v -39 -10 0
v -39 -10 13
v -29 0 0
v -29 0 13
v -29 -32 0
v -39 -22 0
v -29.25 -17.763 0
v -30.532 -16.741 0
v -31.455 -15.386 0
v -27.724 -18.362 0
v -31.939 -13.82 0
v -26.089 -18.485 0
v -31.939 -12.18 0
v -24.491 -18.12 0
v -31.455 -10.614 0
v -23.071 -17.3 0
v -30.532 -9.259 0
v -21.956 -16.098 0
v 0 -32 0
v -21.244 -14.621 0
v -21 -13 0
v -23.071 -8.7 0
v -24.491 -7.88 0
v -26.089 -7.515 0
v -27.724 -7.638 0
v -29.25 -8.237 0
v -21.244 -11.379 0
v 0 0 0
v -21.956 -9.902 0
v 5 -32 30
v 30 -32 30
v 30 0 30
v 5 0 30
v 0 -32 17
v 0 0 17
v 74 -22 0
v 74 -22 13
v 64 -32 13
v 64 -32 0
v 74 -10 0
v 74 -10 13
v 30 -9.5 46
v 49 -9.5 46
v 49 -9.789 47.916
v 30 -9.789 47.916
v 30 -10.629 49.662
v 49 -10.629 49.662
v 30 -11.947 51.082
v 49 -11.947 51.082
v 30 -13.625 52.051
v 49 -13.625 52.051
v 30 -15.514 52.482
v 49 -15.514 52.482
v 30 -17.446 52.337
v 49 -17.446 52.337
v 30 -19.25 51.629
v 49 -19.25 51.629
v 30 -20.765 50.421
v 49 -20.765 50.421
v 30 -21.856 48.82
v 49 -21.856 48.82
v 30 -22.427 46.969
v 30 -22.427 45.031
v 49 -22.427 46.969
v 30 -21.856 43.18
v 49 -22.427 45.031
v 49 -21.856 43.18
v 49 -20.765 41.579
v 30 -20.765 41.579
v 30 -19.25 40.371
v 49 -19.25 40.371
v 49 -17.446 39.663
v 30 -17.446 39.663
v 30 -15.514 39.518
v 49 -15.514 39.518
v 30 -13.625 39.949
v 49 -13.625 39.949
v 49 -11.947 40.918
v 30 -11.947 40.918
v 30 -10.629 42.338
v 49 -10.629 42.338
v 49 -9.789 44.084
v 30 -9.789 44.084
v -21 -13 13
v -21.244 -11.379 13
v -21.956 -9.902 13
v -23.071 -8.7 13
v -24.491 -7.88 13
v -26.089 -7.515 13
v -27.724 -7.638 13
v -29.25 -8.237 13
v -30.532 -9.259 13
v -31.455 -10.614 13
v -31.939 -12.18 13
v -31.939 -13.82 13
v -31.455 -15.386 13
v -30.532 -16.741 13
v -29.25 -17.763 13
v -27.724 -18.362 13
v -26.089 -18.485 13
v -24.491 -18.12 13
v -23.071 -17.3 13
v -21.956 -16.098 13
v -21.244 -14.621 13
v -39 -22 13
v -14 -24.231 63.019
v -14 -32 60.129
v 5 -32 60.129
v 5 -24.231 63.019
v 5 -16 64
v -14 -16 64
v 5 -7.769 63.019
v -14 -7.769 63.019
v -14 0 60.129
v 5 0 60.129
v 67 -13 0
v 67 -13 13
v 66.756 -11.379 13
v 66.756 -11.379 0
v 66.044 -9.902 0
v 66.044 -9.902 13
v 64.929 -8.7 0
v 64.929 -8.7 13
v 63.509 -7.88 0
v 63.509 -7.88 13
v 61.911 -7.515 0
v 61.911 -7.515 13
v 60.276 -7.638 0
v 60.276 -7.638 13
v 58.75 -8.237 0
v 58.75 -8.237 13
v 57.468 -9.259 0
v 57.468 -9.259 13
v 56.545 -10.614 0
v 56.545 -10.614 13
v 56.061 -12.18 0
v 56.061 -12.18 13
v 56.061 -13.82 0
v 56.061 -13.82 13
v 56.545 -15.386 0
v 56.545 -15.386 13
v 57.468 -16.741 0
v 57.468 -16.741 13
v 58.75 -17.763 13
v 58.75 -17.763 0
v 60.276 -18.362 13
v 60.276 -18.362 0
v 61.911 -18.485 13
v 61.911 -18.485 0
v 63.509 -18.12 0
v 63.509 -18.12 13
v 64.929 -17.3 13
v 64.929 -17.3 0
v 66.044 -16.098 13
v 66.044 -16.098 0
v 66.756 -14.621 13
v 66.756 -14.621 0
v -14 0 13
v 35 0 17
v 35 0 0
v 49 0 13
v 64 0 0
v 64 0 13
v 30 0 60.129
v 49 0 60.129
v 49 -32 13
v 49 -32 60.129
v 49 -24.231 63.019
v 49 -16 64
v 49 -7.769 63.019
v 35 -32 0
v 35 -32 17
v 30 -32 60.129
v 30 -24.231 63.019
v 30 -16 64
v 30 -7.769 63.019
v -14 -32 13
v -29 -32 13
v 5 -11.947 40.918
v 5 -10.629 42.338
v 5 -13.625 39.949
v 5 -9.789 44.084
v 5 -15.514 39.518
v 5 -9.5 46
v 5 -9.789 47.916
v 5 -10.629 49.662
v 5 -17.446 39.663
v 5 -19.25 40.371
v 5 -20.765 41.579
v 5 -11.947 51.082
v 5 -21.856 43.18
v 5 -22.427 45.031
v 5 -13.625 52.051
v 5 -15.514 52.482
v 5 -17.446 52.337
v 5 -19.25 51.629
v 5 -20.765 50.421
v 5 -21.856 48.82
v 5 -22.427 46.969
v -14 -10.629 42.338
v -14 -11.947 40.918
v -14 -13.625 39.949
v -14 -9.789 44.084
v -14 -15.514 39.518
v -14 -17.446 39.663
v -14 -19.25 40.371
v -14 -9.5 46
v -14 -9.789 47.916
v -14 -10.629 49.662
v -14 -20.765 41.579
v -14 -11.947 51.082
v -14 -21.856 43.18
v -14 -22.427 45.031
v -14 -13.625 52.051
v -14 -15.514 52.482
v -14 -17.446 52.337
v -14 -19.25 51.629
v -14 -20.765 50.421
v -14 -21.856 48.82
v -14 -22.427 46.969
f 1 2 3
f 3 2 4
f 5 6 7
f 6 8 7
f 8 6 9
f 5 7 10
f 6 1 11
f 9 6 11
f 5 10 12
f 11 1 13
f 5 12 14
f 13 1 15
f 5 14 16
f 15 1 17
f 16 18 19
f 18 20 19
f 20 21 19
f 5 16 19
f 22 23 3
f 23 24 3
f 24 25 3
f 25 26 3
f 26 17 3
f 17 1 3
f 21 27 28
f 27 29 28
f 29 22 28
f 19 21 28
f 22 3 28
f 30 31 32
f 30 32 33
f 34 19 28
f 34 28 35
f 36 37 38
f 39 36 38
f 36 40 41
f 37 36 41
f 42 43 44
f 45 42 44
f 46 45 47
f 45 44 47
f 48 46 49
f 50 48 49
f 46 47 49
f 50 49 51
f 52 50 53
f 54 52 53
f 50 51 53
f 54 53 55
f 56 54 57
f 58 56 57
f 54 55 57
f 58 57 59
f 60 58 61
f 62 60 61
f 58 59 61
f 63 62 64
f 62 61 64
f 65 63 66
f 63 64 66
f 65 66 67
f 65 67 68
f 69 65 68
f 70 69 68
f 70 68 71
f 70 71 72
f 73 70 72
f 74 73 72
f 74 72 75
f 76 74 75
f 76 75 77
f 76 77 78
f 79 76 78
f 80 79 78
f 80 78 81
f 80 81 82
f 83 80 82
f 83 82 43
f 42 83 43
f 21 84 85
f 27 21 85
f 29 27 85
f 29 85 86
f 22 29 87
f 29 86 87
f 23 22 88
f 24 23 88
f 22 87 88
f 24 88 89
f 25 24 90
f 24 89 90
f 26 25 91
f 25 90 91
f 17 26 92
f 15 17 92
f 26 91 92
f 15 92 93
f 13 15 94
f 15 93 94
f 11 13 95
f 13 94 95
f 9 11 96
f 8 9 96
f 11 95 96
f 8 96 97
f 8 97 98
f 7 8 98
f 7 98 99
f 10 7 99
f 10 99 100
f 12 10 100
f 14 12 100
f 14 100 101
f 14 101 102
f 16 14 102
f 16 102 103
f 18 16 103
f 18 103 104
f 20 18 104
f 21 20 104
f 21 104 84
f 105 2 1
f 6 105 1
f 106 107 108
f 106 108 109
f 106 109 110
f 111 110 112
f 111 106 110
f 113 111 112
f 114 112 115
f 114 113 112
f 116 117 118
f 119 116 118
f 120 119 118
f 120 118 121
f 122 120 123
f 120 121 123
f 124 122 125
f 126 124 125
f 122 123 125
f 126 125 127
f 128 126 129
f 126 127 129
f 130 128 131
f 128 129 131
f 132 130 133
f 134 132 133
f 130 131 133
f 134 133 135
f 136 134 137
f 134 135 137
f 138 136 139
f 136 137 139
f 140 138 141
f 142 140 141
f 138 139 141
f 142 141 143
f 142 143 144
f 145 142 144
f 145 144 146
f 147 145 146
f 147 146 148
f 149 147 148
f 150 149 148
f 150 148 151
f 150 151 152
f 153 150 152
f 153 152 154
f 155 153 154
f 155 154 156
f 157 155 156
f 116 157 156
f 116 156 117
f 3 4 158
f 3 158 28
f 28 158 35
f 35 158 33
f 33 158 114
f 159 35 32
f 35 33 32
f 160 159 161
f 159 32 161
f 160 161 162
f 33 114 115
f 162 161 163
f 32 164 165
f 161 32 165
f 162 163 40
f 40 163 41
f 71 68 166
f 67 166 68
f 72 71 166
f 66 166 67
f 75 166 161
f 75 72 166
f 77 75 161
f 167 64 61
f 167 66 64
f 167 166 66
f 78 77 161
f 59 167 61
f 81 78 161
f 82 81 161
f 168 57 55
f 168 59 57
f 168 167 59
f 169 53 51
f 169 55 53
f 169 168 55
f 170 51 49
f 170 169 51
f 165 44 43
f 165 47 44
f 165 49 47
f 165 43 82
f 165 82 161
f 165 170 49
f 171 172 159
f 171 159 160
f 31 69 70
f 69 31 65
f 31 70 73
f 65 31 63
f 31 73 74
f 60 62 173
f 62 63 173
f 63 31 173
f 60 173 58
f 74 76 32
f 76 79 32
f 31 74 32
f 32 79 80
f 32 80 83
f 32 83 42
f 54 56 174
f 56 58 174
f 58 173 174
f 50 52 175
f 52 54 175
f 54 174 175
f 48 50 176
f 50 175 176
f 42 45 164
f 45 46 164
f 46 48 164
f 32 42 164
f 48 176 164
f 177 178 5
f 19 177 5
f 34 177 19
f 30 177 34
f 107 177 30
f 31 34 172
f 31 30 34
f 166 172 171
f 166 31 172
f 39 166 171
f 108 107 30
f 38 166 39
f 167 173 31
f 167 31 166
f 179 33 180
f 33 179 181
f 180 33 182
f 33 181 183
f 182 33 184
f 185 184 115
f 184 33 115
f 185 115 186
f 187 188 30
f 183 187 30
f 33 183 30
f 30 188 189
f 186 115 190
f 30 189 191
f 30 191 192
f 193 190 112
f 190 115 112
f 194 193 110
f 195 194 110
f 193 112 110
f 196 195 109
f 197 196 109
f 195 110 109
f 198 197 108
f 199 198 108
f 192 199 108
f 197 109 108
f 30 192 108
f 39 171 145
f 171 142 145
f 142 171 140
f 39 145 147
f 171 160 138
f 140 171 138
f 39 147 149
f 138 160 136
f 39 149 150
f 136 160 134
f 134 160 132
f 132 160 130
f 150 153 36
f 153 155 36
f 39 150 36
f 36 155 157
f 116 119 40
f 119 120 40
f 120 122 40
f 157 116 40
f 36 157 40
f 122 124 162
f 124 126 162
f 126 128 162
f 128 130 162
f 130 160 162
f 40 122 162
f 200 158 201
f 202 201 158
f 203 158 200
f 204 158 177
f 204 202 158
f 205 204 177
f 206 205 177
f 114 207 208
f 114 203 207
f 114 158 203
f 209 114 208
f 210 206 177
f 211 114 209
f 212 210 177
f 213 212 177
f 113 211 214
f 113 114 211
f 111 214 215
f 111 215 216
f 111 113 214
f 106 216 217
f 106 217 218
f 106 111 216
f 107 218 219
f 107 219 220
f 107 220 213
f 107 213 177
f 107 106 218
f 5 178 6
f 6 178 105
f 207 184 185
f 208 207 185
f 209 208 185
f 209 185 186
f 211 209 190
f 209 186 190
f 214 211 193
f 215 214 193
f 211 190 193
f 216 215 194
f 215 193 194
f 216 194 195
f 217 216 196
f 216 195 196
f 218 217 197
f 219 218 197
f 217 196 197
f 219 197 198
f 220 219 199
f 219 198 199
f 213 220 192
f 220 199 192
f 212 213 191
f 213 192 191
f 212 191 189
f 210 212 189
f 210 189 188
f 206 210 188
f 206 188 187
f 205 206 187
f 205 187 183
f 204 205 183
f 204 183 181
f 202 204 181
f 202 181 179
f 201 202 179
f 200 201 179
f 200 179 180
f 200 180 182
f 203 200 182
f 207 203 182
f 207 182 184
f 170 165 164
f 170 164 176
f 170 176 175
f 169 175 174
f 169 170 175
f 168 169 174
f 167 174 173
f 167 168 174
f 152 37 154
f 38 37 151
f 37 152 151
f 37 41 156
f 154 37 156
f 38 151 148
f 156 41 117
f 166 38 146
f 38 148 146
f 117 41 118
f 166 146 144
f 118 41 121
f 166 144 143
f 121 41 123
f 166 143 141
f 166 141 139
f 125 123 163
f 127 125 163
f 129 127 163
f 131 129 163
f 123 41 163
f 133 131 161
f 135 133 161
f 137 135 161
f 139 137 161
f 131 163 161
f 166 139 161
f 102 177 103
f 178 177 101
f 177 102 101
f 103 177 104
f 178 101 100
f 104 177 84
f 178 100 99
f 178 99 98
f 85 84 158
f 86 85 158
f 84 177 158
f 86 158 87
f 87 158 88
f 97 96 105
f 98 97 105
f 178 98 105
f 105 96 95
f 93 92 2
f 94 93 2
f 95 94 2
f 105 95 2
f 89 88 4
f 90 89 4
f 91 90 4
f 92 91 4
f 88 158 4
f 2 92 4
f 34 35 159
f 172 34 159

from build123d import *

# Parameters (mm, degrees)
F1_DEPTH  = 32
F3_DEPTH  = 25
F4_R      = 5.5
F5_DEPTH  = 25
F6_R      = 5.5
F7_DEPTH  = 25
F10_DEPTH = 19
F8_R      = 6.5
F11_DEPTH = 88.001
F13_DEPTH = 19


with BuildPart() as f1:
    # F0 (on Front) → F1 (new body)
    with BuildSketch(Plane.XZ):
        Polygon((-39, 13), (-39, 0), (0, 0), (0, 17), (35, 17), (35, 0), (74, 0), (74, 13), (49, 13), (49, 60.129), (30, 60.129), (30, 30), (5, 30), (5, 60.129), (-14, 60.129), (-14, 13), align=None)
    extrude(amount=F1_DEPTH)

    # F2 (on face) → F3 (cut)
    with BuildSketch(Plane.XY.offset(13)):
        Polygon((-39, -32), (-29, -32), (-39, -22), align=None)
        Polygon((-39, 0), (-39, -10), (-29, 0), align=None)
    extrude(amount=-F3_DEPTH, mode=Mode.SUBTRACT)

    # F4 (on face) → F5 (cut)
    with BuildSketch(Plane.XY.offset(13)):
        with Locations((61.5, -13)):
            Circle(F4_R)
        Polygon((74, -22), (64, -32), (74, -32), align=None)
        Polygon((64, 0), (74, -10), (74, 0), align=None)
    extrude(amount=-F5_DEPTH, mode=Mode.SUBTRACT)

    # F6 (on face) → F7 (cut)
    with BuildSketch(Plane.XY.offset(13)):
        with Locations((-26.5, -13)):
            Circle(F6_R)
    extrude(amount=-F7_DEPTH, mode=Mode.SUBTRACT)

    # F9 (on face) → F10 (join)
    with BuildSketch(Plane.YZ.offset(49)):
        with BuildLine():
            Line((-32, 60.129), (0, 60.129))
            ThreePointArc((0, 60.129), (-16, 64.000235), (-32, 60.129))
        make_face()
    extrude(amount=-F10_DEPTH)

    # F8 (on face) → F11 (cut, through all)
    with BuildSketch(Plane.YZ.offset(49)):
        with Locations((-16, 46)):
            Circle(F8_R)
    extrude(amount=-F11_DEPTH, mode=Mode.SUBTRACT)

    # F12 (on face) → F13 (join)
    with BuildSketch(Plane(origin=(-14, 0, 0), x_dir=(0, -1, 0), z_dir=(-1, 0, 0))):
        with BuildLine():
            Line((0, 60.129), (32, 60.129))
            ThreePointArc((32, 60.129), (16, 64.000235), (0, 60.129))
        make_face()
    extrude(amount=-F13_DEPTH)


solid = f1.part
